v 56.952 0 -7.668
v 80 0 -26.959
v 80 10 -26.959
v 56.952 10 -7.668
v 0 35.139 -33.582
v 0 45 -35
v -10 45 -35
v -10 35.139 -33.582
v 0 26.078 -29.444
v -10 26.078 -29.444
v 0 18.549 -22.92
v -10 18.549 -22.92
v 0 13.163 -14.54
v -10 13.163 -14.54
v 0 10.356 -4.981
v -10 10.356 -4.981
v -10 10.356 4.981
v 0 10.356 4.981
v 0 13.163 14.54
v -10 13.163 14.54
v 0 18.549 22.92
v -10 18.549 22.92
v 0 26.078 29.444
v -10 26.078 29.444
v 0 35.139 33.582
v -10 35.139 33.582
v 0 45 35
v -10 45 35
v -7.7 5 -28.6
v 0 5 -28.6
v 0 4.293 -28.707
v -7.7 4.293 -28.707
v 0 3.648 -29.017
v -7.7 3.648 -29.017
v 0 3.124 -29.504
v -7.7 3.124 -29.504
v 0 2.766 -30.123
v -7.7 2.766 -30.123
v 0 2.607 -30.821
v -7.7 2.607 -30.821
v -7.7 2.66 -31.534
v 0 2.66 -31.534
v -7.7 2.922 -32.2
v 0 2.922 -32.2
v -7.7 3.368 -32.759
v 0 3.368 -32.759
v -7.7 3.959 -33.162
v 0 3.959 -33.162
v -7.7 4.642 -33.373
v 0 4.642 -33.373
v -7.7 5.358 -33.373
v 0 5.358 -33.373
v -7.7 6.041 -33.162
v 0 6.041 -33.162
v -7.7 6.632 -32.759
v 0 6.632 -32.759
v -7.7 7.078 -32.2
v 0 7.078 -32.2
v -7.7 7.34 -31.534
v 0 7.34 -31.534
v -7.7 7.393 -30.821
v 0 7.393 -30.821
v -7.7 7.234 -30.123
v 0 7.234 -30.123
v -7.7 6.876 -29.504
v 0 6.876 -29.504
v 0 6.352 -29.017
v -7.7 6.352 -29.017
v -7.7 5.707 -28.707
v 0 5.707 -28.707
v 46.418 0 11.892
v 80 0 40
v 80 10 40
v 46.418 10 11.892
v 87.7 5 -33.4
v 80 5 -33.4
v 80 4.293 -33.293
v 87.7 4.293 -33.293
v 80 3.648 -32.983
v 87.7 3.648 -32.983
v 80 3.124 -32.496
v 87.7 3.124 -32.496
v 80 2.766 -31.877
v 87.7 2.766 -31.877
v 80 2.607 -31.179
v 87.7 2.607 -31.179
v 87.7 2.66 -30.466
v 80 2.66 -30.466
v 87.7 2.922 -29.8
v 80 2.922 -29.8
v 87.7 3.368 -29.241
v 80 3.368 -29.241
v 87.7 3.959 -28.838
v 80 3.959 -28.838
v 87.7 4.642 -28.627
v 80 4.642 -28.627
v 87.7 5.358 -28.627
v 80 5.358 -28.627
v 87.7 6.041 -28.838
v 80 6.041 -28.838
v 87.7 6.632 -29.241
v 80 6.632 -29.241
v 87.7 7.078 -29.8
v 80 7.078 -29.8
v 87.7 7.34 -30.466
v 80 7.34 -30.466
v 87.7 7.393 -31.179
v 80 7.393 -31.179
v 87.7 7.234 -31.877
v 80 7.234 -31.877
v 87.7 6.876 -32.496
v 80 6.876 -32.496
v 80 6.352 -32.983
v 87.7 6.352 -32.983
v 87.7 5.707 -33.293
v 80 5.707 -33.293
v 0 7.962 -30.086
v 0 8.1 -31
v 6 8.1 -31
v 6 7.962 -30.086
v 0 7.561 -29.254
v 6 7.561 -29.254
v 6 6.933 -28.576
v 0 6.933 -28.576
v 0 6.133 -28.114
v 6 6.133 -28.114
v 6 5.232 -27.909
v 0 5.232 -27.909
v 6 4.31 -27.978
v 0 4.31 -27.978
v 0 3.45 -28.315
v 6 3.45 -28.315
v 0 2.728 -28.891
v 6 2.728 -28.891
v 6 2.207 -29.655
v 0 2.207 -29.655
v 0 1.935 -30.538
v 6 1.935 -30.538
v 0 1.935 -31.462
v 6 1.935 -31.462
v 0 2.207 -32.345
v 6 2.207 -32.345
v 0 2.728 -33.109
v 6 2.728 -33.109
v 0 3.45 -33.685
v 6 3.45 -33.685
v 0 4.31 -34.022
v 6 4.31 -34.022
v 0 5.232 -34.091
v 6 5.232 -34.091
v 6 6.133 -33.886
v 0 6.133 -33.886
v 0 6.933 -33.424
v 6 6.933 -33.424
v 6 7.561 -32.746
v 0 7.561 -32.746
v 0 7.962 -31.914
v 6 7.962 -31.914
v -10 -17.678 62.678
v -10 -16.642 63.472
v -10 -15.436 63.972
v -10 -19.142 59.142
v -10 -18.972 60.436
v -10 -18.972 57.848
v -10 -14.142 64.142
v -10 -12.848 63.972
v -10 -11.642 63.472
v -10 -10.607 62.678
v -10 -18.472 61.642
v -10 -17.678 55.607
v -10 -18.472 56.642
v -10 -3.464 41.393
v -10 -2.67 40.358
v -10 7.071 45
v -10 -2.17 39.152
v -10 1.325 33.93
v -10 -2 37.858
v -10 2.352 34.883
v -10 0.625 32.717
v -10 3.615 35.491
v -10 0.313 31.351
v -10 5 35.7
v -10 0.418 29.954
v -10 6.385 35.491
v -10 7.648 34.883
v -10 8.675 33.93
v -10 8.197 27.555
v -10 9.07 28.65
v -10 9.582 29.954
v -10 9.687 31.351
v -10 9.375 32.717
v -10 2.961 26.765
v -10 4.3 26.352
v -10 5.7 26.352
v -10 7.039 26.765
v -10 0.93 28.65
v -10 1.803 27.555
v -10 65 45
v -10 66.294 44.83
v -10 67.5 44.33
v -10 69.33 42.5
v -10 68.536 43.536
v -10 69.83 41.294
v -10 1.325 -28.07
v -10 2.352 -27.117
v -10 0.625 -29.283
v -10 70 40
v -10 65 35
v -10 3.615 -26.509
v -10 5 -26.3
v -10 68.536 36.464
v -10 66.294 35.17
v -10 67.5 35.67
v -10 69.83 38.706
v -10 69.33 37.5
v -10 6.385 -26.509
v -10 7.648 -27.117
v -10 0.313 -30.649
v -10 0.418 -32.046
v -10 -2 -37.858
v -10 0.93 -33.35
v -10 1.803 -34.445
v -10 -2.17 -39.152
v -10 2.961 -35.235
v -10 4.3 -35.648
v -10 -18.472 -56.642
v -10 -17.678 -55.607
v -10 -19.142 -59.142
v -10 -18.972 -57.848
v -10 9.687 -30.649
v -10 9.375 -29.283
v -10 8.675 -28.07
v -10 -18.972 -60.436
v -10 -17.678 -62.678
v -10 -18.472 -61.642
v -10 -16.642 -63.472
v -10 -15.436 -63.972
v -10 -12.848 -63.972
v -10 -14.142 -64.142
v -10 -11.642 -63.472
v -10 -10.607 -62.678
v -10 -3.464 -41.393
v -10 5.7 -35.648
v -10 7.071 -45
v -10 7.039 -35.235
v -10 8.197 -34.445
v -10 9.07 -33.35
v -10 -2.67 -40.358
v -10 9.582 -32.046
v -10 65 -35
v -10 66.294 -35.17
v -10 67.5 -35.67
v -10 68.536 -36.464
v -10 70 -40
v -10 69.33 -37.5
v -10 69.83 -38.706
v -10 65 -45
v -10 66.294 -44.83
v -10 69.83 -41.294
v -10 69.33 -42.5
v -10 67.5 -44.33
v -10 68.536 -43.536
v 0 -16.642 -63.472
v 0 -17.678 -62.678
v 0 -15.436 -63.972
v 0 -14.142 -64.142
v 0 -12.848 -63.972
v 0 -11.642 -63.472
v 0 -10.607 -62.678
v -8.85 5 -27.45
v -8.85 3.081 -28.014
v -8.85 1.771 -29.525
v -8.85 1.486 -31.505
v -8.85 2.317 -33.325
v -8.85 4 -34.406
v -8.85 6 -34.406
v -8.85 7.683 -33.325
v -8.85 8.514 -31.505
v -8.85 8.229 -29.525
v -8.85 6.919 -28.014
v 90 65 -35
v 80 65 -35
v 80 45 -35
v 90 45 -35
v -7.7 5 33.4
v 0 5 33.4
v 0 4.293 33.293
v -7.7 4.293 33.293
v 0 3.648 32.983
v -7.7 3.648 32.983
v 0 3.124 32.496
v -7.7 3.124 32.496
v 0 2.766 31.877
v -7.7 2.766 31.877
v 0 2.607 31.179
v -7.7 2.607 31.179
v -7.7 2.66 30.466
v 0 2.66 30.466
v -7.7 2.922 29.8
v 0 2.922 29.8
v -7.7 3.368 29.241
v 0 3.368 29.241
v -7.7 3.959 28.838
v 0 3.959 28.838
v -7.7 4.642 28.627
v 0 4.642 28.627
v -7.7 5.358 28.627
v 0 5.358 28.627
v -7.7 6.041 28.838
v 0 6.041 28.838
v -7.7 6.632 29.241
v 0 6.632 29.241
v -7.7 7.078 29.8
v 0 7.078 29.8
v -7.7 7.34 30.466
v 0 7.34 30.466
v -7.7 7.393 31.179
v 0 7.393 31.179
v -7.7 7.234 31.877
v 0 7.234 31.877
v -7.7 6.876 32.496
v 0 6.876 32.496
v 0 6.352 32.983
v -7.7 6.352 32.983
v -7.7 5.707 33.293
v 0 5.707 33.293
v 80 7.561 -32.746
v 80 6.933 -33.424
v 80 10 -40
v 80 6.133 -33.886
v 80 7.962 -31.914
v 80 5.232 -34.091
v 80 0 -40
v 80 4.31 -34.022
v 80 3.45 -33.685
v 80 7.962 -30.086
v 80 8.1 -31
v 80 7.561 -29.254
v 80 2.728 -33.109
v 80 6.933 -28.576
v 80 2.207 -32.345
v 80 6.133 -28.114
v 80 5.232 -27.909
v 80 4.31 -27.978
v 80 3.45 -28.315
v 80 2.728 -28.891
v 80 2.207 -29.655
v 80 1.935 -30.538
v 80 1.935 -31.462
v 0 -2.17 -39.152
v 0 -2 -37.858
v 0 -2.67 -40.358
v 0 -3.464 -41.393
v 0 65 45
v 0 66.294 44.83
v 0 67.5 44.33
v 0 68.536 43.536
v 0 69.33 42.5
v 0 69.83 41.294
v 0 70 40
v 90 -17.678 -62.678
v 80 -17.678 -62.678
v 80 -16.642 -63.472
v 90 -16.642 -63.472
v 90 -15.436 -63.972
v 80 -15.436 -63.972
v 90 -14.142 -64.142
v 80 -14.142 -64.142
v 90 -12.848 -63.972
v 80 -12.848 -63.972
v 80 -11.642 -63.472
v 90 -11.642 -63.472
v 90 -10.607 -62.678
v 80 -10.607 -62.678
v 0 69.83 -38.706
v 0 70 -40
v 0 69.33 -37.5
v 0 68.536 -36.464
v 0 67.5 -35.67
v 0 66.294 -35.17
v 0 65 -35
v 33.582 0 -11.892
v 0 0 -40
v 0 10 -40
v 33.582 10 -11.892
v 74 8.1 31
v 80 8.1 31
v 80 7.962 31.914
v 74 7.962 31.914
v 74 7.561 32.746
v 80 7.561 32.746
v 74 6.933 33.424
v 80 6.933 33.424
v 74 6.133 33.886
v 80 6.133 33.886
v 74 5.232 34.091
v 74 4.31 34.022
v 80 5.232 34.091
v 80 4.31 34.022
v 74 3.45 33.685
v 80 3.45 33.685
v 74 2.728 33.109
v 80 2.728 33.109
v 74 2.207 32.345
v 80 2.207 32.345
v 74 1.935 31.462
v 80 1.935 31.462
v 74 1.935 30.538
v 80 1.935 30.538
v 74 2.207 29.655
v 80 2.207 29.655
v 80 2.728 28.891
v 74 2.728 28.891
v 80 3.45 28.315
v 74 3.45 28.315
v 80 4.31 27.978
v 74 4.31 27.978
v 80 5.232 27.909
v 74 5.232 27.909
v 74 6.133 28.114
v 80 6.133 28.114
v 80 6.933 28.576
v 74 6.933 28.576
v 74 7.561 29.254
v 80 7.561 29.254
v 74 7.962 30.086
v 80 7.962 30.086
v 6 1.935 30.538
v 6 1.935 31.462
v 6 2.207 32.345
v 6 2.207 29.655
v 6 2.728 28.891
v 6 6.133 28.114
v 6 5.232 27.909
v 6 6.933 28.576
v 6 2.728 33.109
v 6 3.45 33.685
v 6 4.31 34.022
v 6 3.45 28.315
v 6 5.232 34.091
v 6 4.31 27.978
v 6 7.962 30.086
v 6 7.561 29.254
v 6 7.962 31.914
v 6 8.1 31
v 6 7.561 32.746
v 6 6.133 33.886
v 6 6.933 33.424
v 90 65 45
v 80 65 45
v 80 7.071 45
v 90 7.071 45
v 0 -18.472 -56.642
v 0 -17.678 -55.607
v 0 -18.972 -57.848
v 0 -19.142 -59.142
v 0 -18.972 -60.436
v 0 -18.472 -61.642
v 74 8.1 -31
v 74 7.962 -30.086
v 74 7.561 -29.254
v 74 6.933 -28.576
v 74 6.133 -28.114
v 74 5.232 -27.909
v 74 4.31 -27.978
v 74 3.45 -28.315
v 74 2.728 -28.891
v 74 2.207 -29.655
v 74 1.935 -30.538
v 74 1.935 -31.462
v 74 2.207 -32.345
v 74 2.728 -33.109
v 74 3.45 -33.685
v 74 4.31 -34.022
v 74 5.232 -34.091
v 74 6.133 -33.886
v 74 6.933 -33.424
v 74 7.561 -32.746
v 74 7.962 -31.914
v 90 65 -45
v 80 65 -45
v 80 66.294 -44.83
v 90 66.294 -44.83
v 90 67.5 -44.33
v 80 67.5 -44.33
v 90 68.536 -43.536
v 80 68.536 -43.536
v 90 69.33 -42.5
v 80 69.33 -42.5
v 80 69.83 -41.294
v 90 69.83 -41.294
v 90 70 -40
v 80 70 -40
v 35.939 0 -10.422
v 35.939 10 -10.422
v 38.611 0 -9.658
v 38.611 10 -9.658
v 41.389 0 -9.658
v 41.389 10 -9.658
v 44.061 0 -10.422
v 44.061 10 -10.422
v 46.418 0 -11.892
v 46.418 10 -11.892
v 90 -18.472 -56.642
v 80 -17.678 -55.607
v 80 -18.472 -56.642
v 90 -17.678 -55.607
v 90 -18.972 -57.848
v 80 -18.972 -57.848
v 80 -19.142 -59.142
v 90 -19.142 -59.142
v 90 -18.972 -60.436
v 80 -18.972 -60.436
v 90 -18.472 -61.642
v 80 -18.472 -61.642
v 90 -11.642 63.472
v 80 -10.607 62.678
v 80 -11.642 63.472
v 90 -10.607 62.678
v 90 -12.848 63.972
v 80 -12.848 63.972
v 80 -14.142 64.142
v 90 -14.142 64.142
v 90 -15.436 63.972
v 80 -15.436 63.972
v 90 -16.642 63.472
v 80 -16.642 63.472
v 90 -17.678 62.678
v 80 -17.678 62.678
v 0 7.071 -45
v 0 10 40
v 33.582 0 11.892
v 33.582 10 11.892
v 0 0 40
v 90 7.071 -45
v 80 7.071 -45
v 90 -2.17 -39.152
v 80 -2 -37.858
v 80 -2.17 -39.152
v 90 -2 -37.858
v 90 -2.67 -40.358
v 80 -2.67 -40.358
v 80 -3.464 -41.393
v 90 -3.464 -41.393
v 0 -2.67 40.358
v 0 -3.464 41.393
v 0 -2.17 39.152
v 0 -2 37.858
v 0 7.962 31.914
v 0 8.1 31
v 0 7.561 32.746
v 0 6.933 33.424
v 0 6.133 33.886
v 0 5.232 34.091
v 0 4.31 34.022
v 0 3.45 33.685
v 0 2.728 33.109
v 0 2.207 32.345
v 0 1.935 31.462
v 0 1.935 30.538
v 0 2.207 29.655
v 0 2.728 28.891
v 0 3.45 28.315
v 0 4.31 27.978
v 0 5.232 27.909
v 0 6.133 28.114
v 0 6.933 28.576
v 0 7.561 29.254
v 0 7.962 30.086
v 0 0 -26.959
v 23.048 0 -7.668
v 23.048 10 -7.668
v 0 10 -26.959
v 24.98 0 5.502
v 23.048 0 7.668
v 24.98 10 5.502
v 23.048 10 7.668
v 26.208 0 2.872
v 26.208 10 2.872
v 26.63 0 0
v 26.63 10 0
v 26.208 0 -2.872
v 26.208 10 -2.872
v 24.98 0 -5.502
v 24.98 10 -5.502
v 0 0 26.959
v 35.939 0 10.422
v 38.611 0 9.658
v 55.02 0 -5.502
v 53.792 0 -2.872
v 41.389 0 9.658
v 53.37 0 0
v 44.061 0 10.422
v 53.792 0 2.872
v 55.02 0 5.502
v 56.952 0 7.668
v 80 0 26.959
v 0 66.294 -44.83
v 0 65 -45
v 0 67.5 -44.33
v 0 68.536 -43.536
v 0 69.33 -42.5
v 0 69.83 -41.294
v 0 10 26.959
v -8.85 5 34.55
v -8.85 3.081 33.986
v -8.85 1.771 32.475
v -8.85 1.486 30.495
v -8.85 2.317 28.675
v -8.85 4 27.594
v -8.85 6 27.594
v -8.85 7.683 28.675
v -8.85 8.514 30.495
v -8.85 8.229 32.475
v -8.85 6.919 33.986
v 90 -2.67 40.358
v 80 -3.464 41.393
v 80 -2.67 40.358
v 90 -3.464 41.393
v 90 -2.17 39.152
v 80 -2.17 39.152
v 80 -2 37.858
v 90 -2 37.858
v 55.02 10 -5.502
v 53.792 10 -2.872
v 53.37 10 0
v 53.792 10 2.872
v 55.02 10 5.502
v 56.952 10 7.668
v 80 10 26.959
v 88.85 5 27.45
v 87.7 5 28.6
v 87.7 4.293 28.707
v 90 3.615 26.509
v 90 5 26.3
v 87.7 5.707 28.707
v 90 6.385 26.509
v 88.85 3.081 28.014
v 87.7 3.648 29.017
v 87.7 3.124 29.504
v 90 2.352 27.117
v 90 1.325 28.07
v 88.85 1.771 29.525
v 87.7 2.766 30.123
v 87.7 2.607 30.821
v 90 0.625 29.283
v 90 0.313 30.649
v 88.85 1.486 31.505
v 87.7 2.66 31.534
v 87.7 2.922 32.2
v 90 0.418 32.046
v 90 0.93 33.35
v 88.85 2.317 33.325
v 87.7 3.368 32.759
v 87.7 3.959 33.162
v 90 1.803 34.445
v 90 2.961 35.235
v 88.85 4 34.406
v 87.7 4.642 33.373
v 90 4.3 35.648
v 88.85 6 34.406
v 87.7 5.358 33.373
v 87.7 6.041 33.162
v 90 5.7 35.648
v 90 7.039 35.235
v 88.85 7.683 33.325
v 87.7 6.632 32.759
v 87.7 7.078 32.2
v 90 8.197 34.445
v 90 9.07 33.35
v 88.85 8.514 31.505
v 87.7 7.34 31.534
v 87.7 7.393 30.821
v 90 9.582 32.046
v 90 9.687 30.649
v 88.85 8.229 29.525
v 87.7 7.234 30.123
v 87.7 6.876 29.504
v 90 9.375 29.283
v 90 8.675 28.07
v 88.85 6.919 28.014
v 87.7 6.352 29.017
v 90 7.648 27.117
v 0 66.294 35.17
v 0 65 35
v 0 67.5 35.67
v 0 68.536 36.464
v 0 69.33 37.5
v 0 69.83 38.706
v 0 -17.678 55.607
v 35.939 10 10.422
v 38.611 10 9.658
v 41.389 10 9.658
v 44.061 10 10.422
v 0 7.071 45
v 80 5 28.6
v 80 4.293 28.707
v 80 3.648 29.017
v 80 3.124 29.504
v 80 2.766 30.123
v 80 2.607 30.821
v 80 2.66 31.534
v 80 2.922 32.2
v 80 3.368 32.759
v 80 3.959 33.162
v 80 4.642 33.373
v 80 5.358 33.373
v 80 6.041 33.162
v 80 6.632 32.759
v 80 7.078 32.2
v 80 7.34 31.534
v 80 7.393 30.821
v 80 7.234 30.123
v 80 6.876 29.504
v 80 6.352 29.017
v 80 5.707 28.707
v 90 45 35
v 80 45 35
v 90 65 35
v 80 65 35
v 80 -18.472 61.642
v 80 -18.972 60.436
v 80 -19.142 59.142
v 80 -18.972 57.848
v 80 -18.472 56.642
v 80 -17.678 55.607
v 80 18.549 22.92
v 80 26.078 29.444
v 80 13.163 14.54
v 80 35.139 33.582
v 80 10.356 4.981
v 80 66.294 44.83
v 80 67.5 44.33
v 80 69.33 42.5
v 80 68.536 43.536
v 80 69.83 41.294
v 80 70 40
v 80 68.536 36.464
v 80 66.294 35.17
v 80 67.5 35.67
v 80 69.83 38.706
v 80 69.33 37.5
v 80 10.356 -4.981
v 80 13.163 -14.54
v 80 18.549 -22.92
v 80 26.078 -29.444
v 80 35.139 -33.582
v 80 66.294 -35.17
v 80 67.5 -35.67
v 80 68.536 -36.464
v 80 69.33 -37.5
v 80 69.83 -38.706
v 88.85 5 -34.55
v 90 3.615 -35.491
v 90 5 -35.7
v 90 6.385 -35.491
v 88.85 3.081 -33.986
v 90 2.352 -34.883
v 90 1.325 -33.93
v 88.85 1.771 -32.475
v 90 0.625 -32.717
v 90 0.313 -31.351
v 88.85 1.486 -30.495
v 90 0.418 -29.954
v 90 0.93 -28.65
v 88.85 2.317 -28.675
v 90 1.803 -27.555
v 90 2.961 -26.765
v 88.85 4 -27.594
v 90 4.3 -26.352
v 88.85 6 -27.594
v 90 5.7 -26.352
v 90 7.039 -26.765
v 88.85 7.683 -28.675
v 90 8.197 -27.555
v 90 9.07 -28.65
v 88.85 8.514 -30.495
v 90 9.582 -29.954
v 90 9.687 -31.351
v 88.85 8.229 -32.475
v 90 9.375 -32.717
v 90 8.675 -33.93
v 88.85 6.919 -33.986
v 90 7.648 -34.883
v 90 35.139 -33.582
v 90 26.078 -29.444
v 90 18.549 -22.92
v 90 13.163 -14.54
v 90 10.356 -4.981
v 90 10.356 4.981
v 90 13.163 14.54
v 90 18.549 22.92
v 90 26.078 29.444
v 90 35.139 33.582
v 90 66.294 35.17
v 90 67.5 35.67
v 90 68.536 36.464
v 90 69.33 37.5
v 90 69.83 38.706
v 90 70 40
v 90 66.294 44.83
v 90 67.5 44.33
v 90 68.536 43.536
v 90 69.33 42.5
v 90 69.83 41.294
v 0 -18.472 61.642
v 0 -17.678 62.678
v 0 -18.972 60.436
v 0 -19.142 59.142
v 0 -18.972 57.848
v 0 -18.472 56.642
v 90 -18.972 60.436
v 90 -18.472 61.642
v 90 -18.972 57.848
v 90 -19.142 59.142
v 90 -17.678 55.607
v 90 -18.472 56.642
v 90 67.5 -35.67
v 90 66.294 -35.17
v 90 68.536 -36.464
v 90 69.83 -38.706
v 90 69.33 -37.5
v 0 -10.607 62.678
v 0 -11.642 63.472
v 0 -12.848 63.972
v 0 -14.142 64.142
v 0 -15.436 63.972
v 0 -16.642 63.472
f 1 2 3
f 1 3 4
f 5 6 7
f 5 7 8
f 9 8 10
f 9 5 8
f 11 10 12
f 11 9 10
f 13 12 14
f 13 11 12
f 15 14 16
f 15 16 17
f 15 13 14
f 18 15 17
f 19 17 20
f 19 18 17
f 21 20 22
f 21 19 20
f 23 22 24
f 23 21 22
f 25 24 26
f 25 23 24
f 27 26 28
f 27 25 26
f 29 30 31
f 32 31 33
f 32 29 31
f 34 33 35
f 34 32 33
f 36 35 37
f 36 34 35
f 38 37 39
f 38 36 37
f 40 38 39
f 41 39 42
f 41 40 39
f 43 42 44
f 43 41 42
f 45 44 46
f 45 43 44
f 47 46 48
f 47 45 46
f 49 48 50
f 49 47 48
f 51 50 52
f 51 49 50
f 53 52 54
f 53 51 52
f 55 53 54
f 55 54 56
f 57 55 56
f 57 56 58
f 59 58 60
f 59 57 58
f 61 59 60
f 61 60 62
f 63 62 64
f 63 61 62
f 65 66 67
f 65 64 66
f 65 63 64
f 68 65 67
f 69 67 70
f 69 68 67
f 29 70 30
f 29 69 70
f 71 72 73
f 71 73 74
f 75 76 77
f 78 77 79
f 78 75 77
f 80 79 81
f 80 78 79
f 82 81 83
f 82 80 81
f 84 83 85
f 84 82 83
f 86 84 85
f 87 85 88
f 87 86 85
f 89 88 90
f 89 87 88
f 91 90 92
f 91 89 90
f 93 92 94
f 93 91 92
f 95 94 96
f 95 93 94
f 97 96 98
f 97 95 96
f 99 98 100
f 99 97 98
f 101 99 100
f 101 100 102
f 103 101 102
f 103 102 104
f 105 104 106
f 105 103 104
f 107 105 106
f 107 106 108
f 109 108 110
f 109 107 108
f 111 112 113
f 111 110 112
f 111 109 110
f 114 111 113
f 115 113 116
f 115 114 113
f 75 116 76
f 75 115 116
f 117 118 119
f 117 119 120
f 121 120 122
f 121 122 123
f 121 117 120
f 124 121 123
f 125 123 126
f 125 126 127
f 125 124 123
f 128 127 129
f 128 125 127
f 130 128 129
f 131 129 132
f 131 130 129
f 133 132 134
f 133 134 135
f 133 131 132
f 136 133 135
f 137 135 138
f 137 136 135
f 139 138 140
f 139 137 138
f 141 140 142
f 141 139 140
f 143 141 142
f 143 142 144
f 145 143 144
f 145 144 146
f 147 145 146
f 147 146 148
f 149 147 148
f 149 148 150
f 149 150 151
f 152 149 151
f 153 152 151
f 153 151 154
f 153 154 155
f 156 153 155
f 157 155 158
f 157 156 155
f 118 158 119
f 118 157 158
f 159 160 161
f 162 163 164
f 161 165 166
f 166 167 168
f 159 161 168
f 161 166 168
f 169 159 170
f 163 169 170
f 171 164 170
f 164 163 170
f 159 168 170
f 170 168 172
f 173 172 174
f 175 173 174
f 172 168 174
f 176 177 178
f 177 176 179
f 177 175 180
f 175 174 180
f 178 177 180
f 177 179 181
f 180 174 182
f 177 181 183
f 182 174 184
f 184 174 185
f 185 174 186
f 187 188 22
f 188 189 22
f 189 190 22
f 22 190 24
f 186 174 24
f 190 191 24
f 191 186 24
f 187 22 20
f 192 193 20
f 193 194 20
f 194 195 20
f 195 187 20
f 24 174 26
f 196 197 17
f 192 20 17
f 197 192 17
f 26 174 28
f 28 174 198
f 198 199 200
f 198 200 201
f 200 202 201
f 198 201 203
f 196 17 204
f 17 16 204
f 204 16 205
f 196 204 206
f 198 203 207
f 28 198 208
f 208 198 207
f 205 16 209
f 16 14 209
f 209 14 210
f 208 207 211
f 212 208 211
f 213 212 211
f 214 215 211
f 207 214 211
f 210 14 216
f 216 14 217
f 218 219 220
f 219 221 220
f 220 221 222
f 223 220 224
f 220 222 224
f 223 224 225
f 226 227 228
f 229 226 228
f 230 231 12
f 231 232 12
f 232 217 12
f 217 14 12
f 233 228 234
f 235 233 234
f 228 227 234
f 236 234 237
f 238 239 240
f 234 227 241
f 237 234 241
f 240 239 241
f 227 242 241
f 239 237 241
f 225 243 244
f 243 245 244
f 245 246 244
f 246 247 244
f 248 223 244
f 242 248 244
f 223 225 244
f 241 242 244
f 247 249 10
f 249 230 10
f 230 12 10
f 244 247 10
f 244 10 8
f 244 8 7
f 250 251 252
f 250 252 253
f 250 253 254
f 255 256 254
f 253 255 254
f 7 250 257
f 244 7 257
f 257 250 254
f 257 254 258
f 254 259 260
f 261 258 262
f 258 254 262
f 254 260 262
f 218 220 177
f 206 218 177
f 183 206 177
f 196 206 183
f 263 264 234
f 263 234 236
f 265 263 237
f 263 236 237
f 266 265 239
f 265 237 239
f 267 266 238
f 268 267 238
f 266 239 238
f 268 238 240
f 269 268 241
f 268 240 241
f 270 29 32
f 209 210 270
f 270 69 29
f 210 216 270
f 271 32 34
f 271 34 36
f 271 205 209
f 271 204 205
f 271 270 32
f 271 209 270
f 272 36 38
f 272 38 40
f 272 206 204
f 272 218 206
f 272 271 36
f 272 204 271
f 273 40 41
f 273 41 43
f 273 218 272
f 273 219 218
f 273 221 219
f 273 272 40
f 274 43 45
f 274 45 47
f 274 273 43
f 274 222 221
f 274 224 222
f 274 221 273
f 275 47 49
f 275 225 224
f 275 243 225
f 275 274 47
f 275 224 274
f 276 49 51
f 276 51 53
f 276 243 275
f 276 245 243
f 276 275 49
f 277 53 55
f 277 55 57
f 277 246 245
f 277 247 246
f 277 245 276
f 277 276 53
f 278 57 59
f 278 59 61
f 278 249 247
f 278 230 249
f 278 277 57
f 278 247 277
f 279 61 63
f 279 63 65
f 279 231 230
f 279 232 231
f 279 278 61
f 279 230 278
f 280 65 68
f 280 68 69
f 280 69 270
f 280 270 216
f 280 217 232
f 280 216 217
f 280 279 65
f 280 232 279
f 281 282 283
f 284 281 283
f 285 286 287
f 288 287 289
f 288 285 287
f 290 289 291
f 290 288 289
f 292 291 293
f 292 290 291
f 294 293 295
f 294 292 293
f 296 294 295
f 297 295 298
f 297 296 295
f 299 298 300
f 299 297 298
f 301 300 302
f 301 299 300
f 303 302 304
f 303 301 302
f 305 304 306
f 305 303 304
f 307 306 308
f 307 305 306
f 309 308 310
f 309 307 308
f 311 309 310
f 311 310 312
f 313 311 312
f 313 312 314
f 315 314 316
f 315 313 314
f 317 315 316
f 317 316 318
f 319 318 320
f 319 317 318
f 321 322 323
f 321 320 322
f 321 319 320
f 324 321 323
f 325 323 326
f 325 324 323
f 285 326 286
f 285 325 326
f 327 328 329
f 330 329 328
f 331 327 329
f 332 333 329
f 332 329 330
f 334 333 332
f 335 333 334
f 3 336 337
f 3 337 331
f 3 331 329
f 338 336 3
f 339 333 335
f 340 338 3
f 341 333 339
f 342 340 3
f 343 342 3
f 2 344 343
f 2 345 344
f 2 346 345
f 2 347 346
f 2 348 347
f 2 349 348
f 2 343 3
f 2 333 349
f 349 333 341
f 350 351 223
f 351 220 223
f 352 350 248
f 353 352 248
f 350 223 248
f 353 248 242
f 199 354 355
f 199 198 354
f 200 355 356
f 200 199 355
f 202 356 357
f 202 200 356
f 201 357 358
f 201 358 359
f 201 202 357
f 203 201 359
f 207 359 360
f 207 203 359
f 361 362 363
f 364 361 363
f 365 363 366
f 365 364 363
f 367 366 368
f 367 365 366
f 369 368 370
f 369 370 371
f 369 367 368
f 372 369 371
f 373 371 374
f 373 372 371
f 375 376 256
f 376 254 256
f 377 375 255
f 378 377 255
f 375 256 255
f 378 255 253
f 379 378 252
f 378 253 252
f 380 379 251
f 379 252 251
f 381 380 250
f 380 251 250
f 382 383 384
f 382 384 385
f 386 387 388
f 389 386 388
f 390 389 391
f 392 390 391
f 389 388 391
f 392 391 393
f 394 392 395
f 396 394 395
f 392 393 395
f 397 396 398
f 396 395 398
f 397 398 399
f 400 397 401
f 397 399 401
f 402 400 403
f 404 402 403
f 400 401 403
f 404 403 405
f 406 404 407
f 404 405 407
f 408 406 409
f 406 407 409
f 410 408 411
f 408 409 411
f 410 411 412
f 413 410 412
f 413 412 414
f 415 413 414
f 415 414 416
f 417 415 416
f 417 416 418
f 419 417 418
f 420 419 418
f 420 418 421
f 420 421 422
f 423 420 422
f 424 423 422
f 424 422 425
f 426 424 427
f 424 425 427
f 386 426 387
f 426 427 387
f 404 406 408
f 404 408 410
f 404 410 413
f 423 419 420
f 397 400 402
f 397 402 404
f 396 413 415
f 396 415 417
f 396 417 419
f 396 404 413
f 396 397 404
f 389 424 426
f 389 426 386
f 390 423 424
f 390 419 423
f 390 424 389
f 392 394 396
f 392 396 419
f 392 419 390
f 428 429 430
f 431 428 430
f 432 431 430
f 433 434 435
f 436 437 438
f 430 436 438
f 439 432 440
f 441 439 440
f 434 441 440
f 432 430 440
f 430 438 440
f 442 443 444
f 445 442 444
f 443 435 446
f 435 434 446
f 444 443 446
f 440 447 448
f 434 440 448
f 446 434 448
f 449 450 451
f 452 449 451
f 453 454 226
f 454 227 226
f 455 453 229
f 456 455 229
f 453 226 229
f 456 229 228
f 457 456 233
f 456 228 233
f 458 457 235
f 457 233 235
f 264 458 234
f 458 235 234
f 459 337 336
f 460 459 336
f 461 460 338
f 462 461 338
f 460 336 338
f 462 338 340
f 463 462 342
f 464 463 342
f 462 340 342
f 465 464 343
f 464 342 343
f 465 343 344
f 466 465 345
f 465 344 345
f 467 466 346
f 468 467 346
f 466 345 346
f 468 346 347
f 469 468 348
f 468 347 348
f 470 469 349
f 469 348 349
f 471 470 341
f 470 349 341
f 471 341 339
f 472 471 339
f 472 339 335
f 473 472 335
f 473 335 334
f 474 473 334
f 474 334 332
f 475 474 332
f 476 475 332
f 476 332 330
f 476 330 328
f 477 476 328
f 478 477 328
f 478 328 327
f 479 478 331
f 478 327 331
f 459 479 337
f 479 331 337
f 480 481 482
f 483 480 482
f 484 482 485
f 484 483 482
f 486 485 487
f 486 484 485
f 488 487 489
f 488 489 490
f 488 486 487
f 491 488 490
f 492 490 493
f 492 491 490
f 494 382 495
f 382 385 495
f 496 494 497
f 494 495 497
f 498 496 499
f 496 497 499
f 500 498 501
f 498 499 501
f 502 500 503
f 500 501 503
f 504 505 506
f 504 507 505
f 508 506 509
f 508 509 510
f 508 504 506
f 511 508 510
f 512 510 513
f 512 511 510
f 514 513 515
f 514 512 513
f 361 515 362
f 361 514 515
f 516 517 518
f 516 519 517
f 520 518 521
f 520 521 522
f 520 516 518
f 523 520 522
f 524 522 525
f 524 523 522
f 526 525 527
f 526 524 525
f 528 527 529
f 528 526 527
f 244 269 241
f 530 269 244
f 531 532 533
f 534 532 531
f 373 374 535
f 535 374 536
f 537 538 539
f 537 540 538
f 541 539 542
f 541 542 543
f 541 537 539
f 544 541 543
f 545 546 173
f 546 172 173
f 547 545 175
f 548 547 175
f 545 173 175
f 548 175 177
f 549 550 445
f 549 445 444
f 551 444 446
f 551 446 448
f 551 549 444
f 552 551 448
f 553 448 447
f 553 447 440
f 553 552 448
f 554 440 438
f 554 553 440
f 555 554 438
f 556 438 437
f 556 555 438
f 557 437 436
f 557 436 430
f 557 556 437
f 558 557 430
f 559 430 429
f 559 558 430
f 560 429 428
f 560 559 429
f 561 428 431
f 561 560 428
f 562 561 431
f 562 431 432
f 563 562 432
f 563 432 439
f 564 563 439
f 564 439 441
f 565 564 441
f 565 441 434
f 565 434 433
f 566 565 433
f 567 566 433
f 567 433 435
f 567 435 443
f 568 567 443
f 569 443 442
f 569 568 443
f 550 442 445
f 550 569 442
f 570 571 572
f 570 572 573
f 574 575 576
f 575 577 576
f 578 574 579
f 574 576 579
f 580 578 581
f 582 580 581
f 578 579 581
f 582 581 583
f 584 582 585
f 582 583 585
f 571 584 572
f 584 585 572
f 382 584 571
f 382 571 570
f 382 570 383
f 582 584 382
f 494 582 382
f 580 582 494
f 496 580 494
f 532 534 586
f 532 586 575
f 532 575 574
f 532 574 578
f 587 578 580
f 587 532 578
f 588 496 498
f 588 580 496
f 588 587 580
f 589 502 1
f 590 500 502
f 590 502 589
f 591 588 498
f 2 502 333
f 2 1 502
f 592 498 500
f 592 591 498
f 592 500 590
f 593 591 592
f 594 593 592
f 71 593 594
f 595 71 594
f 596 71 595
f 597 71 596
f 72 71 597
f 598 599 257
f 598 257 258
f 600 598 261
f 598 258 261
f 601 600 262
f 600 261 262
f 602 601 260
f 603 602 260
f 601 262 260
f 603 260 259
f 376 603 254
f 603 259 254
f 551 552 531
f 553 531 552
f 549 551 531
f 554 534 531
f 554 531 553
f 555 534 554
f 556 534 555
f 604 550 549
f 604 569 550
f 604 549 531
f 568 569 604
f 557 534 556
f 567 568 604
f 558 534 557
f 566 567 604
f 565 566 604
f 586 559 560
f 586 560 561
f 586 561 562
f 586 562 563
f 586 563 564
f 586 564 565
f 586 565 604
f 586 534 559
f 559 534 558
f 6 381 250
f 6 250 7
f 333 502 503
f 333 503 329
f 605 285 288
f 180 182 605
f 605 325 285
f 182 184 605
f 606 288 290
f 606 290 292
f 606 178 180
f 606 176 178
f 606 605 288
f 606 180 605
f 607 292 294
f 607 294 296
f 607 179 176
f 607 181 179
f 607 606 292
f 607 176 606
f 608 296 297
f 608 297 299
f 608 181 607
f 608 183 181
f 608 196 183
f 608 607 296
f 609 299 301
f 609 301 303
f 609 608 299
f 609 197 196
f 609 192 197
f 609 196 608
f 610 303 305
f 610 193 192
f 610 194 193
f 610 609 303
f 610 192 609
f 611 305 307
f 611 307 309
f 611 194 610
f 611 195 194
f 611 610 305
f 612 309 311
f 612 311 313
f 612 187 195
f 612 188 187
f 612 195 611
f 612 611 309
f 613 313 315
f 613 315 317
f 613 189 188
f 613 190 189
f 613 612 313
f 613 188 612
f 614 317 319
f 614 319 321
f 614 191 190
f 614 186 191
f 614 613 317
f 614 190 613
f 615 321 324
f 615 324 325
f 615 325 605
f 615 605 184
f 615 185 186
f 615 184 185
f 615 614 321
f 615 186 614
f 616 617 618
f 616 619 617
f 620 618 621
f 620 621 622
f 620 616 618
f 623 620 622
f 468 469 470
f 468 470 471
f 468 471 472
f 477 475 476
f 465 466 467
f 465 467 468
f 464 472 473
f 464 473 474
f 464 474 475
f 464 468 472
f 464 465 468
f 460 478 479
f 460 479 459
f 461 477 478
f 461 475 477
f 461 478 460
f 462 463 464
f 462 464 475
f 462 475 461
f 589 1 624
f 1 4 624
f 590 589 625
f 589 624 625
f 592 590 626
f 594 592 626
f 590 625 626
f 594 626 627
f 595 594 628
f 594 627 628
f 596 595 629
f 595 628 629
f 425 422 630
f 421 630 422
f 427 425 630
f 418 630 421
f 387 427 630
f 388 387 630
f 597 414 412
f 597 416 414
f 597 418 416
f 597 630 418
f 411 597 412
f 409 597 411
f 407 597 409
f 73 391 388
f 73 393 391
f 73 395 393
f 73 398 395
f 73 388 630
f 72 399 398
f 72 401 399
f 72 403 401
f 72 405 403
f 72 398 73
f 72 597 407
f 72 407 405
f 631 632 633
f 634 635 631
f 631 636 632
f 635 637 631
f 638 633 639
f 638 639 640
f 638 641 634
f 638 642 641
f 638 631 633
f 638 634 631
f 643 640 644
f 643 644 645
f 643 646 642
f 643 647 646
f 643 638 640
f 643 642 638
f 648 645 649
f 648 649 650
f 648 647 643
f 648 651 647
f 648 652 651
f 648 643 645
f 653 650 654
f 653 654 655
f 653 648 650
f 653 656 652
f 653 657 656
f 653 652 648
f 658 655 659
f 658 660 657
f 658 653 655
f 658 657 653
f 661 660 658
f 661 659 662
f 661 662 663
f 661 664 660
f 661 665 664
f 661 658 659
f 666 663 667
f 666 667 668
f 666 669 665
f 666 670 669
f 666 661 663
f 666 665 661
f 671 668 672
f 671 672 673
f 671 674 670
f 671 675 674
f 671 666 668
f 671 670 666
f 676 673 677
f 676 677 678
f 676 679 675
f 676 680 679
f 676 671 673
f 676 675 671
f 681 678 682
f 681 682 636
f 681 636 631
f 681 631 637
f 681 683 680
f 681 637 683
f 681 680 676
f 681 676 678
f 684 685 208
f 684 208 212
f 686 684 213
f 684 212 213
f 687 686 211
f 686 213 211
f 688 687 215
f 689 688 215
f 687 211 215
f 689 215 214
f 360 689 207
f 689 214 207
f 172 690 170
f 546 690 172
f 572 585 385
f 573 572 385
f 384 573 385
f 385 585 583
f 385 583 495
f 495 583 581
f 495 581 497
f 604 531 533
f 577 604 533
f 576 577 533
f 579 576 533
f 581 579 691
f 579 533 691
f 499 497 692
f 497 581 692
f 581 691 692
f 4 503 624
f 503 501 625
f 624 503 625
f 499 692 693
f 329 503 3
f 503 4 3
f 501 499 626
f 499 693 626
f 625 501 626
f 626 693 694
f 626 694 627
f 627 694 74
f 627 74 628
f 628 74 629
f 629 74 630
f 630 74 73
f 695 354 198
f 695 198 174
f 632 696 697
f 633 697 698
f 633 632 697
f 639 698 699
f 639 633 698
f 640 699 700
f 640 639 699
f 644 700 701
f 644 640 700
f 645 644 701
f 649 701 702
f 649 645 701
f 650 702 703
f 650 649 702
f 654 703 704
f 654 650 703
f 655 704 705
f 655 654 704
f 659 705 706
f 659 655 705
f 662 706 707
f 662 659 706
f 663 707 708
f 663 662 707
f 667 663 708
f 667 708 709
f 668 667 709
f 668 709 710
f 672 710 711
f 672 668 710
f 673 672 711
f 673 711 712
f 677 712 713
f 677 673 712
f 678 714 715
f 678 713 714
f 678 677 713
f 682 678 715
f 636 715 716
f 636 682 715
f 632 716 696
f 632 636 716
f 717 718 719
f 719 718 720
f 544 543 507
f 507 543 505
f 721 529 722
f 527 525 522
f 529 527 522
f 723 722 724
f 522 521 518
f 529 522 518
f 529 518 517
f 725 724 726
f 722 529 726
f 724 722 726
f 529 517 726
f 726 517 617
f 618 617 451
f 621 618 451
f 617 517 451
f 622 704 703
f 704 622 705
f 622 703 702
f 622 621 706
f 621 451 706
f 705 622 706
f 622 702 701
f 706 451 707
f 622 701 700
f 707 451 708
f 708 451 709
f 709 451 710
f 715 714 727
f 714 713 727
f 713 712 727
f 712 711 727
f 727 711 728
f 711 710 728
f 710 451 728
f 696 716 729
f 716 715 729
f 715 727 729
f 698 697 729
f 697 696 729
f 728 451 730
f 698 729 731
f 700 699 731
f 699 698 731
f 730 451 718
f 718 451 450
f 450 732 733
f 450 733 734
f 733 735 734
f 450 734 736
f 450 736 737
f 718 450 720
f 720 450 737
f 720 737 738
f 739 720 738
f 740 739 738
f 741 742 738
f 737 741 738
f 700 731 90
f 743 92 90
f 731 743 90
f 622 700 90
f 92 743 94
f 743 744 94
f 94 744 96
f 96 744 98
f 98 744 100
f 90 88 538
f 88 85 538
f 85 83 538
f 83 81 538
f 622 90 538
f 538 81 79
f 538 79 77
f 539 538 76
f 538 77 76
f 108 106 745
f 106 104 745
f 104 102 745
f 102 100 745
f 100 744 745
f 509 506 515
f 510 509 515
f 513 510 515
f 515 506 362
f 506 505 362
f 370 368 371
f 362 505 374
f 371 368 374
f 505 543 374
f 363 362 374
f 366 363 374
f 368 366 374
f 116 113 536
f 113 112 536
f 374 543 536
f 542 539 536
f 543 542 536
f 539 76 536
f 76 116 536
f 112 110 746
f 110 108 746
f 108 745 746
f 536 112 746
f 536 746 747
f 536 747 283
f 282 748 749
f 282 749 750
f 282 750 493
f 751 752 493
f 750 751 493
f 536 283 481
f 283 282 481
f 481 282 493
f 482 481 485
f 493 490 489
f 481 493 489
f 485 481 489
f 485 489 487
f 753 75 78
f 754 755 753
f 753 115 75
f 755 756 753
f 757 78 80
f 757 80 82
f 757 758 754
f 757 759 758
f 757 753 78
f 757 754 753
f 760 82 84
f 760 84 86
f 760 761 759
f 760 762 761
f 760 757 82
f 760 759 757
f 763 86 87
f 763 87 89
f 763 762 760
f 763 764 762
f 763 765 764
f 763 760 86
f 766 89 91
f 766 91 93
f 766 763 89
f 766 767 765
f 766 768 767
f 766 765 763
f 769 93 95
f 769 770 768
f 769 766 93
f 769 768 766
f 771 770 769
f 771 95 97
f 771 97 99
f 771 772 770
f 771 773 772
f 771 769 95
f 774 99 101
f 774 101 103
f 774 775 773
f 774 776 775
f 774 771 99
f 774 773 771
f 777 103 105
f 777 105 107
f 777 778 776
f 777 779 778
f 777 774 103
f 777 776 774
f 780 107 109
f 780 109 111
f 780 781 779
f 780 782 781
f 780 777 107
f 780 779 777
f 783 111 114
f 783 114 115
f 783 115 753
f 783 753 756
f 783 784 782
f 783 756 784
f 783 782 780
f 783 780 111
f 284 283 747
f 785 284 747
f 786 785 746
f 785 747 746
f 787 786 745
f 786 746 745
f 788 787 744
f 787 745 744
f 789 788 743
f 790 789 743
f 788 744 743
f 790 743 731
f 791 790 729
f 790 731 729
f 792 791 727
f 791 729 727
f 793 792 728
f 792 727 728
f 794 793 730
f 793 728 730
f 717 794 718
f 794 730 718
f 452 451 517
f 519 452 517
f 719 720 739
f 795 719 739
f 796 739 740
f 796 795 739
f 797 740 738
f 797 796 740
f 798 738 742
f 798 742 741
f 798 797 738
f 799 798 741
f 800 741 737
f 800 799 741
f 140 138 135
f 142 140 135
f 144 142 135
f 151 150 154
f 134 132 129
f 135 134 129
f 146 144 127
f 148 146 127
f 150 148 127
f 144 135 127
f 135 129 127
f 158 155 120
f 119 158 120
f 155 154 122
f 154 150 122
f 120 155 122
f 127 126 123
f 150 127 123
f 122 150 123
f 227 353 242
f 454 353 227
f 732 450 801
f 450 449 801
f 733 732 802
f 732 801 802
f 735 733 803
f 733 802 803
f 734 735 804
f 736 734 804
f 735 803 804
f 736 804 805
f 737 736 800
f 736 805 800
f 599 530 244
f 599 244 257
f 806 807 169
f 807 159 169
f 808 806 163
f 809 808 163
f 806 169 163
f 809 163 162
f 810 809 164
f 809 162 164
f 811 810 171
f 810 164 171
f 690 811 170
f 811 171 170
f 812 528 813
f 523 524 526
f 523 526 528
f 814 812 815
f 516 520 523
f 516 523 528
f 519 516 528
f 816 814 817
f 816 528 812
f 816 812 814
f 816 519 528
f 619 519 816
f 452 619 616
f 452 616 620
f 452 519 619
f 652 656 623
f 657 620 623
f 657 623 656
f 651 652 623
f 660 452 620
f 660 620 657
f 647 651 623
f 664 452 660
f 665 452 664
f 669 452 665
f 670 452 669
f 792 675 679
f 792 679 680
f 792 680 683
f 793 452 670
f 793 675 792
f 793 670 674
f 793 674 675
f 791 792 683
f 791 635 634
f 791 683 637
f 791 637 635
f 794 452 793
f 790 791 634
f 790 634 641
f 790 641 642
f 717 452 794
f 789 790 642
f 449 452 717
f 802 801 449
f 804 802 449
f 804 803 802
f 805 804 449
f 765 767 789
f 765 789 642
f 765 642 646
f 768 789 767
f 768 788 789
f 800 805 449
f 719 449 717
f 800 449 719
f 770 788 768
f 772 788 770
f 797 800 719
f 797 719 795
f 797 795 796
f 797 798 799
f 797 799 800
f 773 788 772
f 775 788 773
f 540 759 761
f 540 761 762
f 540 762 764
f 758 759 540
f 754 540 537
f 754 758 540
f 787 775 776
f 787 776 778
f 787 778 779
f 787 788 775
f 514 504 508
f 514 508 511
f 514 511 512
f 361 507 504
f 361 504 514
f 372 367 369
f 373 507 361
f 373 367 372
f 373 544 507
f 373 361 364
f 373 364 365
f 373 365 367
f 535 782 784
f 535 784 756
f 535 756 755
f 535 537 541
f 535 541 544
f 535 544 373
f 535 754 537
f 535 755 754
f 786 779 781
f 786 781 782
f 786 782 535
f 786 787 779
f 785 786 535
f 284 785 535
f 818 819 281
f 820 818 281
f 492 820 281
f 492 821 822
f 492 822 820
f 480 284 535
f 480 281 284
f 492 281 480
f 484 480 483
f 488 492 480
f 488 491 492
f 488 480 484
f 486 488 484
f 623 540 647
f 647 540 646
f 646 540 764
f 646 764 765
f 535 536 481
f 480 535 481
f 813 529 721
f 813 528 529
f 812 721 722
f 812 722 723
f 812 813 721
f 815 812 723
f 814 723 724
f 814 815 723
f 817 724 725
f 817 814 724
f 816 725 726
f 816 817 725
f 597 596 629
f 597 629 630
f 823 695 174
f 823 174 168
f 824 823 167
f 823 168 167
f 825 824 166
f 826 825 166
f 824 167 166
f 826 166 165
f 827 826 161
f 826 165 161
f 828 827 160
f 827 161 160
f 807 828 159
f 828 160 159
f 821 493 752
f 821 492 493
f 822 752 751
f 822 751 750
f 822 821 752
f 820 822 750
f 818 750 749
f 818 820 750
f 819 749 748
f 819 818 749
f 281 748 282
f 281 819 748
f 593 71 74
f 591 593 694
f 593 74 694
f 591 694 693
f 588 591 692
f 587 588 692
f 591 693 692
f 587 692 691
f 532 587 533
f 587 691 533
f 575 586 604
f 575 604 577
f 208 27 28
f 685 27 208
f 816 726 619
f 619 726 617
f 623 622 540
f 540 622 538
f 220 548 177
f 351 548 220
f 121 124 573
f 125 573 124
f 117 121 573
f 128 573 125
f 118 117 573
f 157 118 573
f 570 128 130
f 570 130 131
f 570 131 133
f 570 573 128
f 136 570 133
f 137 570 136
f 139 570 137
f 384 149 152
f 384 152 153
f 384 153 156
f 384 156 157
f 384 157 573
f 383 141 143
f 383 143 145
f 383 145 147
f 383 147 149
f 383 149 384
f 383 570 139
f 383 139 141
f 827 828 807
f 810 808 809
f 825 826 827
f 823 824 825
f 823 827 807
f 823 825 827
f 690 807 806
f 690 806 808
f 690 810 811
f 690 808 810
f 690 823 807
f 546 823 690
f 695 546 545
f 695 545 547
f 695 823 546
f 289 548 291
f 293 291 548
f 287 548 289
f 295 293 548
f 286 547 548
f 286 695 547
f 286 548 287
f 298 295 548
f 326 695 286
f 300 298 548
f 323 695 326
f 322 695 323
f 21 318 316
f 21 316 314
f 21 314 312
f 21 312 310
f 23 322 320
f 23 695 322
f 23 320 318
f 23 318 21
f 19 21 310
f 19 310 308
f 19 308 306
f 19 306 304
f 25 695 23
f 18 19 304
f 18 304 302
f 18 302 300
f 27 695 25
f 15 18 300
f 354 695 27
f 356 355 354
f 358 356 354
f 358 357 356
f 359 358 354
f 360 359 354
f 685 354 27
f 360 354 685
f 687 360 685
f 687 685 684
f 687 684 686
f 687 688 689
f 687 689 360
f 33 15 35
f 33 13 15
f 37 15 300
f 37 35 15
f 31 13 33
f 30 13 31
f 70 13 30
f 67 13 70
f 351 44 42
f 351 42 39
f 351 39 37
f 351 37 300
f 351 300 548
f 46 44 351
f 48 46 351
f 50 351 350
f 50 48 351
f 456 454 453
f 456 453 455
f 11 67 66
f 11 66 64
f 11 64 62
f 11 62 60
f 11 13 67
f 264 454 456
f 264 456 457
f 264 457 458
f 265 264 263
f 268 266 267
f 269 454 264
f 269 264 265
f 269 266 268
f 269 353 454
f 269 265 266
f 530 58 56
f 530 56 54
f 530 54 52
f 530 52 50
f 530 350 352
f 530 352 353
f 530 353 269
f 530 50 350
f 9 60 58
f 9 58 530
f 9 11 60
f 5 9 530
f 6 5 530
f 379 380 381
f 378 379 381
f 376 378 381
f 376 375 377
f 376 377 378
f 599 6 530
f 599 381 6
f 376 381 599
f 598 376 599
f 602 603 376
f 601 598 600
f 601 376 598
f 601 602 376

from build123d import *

# Parameters (mm, degrees)
BOSS_EXTRUDE1_DEPTH                            = 10
FILLET1_R                                      = 5
LPATTERN1_COUNT                                = 2
LPATTERN1_PITCH                                = 80
BOSS_EXTRUDE2_DEPTH                            = 10
FILLET2_R                                      = 10
F_6_0MM_DOWEL_HOLE1_OUTLINE_R                  = 3.1
F_6_0MM_DOWEL_HOLE1_DEPTH                      = 6
CSK_FOR_M4_FLAT_HEAD_MACHINE_SCREW3_AT_2_COUNT = 2
CSK_FOR_M4_FLAT_HEAD_MACHINE_SCREW3_AT_2_PITCH = 62
CSK_FOR_M4_FLAT_HEAD_MACHINE_SCREW4_AT_2_COUNT = 2
CSK_FOR_M4_FLAT_HEAD_MACHINE_SCREW4_AT_2_PITCH = 62


# Read off the part's stored shape, not the designer's step: Ø6.0mm Dowel Hole1
with BuildPart() as part:
    # Sketch1 → Boss-Extrude1 (new body)
    with BuildSketch(Plane(origin=(0, 0, 0), x_dir=(0, 0, -1), z_dir=(1, 0, 0))):
        with BuildLine():
            Line((-45, 70), (-45, 7.071067812))
            Line((-45, 7.071067812), (-66.213203436, -14.142135624))
            Line((-66.213203436, -14.142135624), (-59.142135624, -21.213203436))
            Line((-59.142135624, -21.213203436), (-39.928932188, -2))
            Line((-39.928932188, -2), (39.928932188, -2))
            Line((39.928932188, -2), (59.142135624, -21.213203436))
            Line((59.142135624, -21.213203436), (66.213203436, -14.142135624))
            Line((66.213203436, -14.142135624), (45, 7.071067812))
            Line((45, 7.071067812), (45, 70))
            Line((45, 70), (35, 70))
            Line((35, 70), (35, 45))
            ThreePointArc((35, 45), (0, 10), (-35, 45))
            Line((-35, 45), (-35, 70))
            Line((-35, 70), (-45, 70))
        make_face()
    extrude(amount=BOSS_EXTRUDE1_DEPTH)

    # Fillet1
    fillet1_edges = [part.edges().sort_by_distance(p)[0] for p in [
        (5, 70, -45),
        (5, 70, -35),
        (5, 70, 35),
        (5, 70, 45),
        (5, -14.142135624, 66.213203436),
        (5, -21.213203436, 59.142135624),
        (5, -21.213203436, -59.142135624),
        (5, -14.142135624, -66.213203436),
        (5, -2, 39.928932188),
        (5, -2, -39.928932188),
    ]]
    fillet(fillet1_edges, radius=FILLET1_R - 0.0001)  # a hair under: the kernel refuses the full size


with BuildPart() as lpattern1_1:
    # LPattern1: pattern copy
    add(part.part.moved(Location(Vector(1, 0, 0) * (1 * LPATTERN1_PITCH))))

    # Sketch10 → CSK for M4 Flat Head Machine Screw3 (revolve, cut)
    with BuildSketch(Plane(origin=(90, 5, -31), x_dir=(0, 0, -1), z_dir=(0, 1, 0))):
        Polygon((0, 0), (0, 100), (2.4, 100), (2.4, 2.3), (4.7, 0), align=None)
    csk_for_m4_flat_head_machine_screw3 = revolve(axis=Axis((96.35, 5, -31), (-1, 0, 0)), mode=Mode.SUBTRACT)

    # CSK for M4 Flat Head Machine Screw3 at 2: CSK for M4 Flat Head Machine Screw3 ×2
    with Locations(*[(0, 0, i * CSK_FOR_M4_FLAT_HEAD_MACHINE_SCREW3_AT_2_PITCH) for i in range(1, CSK_FOR_M4_FLAT_HEAD_MACHINE_SCREW3_AT_2_COUNT)]):
        add(csk_for_m4_flat_head_machine_screw3, mode=Mode.SUBTRACT)


with BuildPart() as body_3:
    # Sketch2 → Boss-Extrude2 (new body)
    with BuildSketch(Plane.XZ):
        Polygon((0, -26.959456928), (0, -40), (40, -6.520271536), (80, -40), (80, -26.959456928), (47.790112806, 0), (80, 26.959456928), (80, 40), (40, 6.520271536), (0, 40), (0, 26.959456928), (32.209887194, 0), align=None)
    extrude(amount=-BOSS_EXTRUDE2_DEPTH)

    # Fillet2
    fillet2_edges = [body_3.edges().sort_by_distance(p)[0] for p in [
        (32.209887194, 5, 0),
        (40, 5, 6.520271536),
        (47.790112806, 5, 0),
        (40, 5, -6.520271536),
    ]]
    fillet(fillet2_edges, radius=FILLET2_R)

    # Ø6.0mm Dowel Hole1 outline → Ø6.0mm Dowel Hole1 (cut)
    with BuildSketch(Plane.YZ):
        with Locations((5, 31)):
            Circle(F_6_0MM_DOWEL_HOLE1_OUTLINE_R)
        with Locations((5, -31)):
            Circle(F_6_0MM_DOWEL_HOLE1_OUTLINE_R)
    f_6_0mm_dowel_hole1 = extrude(amount=F_6_0MM_DOWEL_HOLE1_DEPTH, mode=Mode.SUBTRACT)

    # Mirror1: Ø6.0mm Dowel Hole1 across plane
    add(f_6_0mm_dowel_hole1.mirror(Plane.ZY.offset(-40)), mode=Mode.SUBTRACT)


with BuildPart() as body_4:
    # Mirror2: mirrored copy
    add(part.part.mirror(Plane(origin=(0, 0, 0), x_dir=(0, 0, 1), z_dir=(1, 0, 0))))

    # Sketch12 → CSK for M4 Flat Head Machine Screw4 (revolve, cut)
    with BuildSketch(Plane(origin=(-10, 5, -31), x_dir=(0, 0, 1), z_dir=(0, 1, 0))):
        Polygon((0, 0), (0, 100), (2.4, 100), (2.4, 2.3), (4.7, 0), align=None)
    csk_for_m4_flat_head_machine_screw4 = revolve(axis=Axis((-16.35, 5, -31), (1, 0, 0)), mode=Mode.SUBTRACT)

    # CSK for M4 Flat Head Machine Screw4 at 2: CSK for M4 Flat Head Machine Screw4 ×2
    with Locations(*[(0, 0, i * CSK_FOR_M4_FLAT_HEAD_MACHINE_SCREW4_AT_2_PITCH) for i in range(1, CSK_FOR_M4_FLAT_HEAD_MACHINE_SCREW4_AT_2_COUNT)]):
        add(csk_for_m4_flat_head_machine_screw4, mode=Mode.SUBTRACT)


solid = Compound([lpattern1_1.part, body_3.part, body_4.part])
